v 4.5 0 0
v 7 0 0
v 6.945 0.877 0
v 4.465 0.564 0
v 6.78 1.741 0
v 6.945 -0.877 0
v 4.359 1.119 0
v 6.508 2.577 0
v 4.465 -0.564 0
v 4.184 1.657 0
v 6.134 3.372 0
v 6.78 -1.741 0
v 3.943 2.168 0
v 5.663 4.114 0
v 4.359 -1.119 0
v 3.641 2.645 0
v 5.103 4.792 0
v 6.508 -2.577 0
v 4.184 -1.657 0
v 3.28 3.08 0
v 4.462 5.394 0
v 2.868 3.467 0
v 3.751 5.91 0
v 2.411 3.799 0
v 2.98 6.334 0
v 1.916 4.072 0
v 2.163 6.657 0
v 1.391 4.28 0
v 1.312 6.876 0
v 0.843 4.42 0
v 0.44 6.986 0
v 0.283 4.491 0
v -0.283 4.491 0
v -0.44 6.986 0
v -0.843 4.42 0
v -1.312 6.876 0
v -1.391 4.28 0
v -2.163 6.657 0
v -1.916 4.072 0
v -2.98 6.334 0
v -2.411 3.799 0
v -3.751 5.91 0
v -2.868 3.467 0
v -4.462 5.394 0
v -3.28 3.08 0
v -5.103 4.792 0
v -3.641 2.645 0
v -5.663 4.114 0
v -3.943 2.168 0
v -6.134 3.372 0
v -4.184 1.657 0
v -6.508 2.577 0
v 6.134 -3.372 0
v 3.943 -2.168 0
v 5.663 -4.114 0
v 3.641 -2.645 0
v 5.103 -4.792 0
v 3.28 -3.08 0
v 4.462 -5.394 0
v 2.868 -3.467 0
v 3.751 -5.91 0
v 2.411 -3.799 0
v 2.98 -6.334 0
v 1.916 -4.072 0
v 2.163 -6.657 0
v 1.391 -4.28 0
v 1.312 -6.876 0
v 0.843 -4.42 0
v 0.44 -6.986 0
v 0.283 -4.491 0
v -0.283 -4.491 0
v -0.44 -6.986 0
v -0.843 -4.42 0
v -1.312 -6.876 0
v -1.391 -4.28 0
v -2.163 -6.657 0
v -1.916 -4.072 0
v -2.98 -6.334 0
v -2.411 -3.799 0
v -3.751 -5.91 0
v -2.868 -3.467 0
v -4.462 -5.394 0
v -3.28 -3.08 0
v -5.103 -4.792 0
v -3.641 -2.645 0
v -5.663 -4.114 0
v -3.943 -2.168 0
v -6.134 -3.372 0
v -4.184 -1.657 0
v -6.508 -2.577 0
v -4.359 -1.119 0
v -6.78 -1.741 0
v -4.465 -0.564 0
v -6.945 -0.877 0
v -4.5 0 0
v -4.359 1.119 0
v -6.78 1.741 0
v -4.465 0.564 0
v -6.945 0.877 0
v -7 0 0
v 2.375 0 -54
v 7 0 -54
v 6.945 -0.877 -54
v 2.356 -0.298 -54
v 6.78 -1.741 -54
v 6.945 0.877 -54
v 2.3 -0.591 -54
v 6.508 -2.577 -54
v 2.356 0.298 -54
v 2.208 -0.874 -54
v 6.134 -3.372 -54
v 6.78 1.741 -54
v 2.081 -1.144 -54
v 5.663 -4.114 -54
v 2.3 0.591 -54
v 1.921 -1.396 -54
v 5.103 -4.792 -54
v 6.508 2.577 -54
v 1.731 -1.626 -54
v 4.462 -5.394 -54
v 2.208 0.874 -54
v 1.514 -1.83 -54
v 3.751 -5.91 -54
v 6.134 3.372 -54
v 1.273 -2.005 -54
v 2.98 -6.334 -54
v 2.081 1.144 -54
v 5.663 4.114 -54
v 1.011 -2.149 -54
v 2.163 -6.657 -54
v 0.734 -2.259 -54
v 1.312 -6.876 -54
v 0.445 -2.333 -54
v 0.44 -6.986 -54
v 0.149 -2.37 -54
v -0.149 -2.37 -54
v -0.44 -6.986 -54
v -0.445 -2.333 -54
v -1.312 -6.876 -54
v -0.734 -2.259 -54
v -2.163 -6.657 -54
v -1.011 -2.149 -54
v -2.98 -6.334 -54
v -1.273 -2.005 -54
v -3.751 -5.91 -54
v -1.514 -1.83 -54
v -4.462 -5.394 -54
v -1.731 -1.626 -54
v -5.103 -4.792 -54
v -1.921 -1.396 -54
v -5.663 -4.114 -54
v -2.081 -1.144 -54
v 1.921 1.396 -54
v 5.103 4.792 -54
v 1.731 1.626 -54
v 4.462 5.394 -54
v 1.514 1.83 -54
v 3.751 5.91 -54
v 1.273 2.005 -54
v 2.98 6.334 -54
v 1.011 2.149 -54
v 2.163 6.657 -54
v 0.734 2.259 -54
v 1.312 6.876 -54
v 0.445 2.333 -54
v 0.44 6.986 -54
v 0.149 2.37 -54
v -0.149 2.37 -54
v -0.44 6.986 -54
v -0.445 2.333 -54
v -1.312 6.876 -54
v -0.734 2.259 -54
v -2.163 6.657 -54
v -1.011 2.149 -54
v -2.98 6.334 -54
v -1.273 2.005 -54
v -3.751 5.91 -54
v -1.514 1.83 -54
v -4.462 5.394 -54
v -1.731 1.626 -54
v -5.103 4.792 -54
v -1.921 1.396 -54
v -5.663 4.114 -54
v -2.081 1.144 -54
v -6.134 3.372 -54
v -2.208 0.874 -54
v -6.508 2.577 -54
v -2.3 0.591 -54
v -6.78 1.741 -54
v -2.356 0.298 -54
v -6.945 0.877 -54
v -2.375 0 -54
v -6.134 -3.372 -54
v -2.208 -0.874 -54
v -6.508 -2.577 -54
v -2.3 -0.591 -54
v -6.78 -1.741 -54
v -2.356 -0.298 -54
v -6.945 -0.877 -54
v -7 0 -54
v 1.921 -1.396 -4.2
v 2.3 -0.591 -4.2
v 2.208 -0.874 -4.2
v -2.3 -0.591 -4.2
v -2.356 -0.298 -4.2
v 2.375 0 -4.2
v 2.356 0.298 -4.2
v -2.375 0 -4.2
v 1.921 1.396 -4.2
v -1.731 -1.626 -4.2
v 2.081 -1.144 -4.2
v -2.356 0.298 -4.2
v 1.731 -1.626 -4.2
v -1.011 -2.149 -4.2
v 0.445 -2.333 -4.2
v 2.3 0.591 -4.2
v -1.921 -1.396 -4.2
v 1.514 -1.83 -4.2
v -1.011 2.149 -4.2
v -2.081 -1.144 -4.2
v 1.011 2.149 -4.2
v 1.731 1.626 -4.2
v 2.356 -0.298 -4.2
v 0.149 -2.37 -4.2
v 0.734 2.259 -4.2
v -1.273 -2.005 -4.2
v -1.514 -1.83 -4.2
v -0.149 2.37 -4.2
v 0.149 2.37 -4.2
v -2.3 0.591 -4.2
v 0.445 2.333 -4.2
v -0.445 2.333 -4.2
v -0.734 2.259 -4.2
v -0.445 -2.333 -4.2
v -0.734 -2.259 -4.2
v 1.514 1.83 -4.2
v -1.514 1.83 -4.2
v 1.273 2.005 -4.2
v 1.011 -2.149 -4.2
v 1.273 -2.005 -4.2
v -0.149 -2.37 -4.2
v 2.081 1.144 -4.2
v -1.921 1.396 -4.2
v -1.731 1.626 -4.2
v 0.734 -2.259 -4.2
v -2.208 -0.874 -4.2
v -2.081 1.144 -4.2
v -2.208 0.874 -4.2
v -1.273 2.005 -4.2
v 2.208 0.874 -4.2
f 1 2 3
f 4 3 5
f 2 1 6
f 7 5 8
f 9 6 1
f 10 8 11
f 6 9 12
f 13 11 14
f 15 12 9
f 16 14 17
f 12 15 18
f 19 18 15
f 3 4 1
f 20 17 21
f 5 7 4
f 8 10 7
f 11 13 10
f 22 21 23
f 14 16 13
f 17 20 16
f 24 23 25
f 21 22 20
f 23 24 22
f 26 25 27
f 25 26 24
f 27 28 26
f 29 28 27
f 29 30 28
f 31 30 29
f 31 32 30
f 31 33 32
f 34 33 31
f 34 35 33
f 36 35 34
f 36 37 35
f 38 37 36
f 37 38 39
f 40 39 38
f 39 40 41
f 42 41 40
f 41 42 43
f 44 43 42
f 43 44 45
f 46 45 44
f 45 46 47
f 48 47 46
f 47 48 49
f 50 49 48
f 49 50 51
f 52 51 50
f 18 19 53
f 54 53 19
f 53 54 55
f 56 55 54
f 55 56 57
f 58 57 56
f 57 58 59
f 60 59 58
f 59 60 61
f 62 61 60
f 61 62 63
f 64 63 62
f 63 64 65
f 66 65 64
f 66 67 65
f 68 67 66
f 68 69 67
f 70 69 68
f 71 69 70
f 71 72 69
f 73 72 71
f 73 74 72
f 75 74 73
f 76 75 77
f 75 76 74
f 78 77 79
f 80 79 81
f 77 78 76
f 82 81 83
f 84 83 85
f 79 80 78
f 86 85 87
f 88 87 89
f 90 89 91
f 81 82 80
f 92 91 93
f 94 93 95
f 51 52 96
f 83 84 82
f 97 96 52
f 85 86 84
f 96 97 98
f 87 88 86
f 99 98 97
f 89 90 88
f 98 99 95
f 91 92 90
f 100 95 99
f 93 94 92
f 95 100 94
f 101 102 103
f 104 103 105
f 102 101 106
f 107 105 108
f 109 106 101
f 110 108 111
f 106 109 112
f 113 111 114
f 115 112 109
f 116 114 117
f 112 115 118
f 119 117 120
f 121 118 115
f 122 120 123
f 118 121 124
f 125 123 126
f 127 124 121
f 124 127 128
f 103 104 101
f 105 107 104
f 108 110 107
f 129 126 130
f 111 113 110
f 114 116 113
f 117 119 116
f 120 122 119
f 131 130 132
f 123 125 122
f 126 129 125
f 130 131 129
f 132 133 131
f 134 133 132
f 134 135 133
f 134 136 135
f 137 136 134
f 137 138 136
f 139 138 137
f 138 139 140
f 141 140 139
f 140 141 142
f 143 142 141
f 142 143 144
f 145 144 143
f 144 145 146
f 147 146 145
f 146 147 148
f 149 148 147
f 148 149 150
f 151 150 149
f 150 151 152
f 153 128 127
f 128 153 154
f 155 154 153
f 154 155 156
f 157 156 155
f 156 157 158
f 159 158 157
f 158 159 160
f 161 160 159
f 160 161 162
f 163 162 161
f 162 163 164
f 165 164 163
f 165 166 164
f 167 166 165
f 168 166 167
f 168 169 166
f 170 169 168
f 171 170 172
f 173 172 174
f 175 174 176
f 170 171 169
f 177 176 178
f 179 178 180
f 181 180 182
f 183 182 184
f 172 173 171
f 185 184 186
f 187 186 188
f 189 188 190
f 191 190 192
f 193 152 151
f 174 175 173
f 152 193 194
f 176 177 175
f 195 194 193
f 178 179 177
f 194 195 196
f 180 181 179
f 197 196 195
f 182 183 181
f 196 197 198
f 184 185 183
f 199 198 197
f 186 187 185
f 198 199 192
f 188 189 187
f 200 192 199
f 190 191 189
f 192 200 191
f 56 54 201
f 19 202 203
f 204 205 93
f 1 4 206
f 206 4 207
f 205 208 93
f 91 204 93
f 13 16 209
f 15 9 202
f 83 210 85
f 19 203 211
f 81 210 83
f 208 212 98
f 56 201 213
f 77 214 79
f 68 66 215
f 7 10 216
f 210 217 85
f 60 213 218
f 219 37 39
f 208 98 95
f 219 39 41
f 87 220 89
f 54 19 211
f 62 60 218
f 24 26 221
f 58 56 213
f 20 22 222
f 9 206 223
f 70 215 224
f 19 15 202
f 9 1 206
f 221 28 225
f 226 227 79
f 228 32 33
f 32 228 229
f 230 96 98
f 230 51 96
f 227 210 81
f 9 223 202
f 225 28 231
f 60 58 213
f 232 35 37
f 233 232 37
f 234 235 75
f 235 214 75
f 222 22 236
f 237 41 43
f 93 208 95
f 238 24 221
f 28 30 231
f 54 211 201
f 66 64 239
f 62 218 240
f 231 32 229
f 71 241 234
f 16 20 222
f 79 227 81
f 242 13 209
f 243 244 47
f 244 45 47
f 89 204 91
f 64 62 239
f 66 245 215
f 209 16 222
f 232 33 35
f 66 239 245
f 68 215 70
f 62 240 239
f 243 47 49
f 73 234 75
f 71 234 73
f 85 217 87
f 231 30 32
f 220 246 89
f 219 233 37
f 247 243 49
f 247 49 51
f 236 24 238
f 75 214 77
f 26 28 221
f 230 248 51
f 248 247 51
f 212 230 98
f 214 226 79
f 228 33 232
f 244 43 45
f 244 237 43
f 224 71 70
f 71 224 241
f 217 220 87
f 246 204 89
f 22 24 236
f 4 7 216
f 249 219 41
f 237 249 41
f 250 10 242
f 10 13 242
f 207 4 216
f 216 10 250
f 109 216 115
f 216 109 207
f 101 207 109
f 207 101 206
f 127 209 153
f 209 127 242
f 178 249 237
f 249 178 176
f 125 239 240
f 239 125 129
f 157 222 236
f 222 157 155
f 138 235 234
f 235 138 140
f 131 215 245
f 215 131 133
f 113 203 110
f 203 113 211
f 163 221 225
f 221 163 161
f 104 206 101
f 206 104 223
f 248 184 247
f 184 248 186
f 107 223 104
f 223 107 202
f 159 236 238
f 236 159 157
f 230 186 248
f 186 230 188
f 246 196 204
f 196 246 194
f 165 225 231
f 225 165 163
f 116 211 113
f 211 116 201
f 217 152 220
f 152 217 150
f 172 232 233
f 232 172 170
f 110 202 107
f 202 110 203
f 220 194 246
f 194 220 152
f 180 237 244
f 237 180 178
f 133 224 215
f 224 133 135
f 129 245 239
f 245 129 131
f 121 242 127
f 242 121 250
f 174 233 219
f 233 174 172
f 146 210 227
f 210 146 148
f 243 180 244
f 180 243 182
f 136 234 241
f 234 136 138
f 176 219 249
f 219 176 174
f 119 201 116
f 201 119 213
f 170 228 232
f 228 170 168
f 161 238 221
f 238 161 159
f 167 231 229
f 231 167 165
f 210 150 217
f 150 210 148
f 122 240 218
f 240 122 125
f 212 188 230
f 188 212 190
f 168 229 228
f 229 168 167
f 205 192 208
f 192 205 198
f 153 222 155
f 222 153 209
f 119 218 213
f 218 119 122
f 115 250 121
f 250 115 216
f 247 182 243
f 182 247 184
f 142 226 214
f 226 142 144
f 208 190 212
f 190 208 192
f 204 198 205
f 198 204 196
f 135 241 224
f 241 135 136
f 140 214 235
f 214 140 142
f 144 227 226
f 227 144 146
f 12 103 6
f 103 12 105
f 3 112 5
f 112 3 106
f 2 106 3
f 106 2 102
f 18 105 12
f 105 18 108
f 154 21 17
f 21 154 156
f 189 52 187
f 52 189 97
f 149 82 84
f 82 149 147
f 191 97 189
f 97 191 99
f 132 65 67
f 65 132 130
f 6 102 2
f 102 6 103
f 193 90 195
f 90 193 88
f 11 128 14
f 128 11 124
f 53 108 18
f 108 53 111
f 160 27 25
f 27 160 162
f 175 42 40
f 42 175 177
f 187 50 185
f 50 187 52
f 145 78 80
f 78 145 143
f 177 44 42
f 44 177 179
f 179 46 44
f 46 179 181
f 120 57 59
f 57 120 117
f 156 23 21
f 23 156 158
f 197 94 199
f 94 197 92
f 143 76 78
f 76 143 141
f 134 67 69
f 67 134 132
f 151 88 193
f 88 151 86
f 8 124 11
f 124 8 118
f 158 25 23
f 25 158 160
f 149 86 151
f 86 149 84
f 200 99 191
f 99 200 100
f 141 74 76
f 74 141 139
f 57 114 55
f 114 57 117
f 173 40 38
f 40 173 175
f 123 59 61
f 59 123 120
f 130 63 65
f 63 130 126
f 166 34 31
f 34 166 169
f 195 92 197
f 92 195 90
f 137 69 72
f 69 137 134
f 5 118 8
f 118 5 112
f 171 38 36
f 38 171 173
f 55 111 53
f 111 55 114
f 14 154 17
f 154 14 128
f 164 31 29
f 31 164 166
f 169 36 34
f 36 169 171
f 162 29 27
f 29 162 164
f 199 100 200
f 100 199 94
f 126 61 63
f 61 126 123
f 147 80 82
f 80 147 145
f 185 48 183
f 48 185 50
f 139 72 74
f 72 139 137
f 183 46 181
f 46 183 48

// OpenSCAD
$fn = 50;


difference() {
	union() {
		translate(v = [0, 0, -54.0000000000]) {
			cylinder(h = 54, r = 7.0000000000);
		}
		cylinder(h = 0, r = 16.0000000000);
	}
	union() {
		translate(v = [0, 0, 0]) {
			rotate(a = [0, 0, 0]) {
				difference() {
					union() {
						#translate(v = [0, 0, -54.0000000000]) {
							cylinder(h = 54, r = 2.2500000000);
						}
						#translate(v = [0, 0, -4.2000000000]) {
							cylinder(h = 4.2000000000, r = 7.0000000000, r1 = 2.3750000000, r2 = 4.5000000000);
						}
						#translate(v = [0, 0, -54.0000000000]) {
							cylinder(h = 54, r = 2.3750000000);
						}
						#translate(v = [0, 0, -54.0000000000]) {
							cylinder(h = 54, r = 2.2500000000);
						}
					}
					union();
				}
			}
		}
	}
}
